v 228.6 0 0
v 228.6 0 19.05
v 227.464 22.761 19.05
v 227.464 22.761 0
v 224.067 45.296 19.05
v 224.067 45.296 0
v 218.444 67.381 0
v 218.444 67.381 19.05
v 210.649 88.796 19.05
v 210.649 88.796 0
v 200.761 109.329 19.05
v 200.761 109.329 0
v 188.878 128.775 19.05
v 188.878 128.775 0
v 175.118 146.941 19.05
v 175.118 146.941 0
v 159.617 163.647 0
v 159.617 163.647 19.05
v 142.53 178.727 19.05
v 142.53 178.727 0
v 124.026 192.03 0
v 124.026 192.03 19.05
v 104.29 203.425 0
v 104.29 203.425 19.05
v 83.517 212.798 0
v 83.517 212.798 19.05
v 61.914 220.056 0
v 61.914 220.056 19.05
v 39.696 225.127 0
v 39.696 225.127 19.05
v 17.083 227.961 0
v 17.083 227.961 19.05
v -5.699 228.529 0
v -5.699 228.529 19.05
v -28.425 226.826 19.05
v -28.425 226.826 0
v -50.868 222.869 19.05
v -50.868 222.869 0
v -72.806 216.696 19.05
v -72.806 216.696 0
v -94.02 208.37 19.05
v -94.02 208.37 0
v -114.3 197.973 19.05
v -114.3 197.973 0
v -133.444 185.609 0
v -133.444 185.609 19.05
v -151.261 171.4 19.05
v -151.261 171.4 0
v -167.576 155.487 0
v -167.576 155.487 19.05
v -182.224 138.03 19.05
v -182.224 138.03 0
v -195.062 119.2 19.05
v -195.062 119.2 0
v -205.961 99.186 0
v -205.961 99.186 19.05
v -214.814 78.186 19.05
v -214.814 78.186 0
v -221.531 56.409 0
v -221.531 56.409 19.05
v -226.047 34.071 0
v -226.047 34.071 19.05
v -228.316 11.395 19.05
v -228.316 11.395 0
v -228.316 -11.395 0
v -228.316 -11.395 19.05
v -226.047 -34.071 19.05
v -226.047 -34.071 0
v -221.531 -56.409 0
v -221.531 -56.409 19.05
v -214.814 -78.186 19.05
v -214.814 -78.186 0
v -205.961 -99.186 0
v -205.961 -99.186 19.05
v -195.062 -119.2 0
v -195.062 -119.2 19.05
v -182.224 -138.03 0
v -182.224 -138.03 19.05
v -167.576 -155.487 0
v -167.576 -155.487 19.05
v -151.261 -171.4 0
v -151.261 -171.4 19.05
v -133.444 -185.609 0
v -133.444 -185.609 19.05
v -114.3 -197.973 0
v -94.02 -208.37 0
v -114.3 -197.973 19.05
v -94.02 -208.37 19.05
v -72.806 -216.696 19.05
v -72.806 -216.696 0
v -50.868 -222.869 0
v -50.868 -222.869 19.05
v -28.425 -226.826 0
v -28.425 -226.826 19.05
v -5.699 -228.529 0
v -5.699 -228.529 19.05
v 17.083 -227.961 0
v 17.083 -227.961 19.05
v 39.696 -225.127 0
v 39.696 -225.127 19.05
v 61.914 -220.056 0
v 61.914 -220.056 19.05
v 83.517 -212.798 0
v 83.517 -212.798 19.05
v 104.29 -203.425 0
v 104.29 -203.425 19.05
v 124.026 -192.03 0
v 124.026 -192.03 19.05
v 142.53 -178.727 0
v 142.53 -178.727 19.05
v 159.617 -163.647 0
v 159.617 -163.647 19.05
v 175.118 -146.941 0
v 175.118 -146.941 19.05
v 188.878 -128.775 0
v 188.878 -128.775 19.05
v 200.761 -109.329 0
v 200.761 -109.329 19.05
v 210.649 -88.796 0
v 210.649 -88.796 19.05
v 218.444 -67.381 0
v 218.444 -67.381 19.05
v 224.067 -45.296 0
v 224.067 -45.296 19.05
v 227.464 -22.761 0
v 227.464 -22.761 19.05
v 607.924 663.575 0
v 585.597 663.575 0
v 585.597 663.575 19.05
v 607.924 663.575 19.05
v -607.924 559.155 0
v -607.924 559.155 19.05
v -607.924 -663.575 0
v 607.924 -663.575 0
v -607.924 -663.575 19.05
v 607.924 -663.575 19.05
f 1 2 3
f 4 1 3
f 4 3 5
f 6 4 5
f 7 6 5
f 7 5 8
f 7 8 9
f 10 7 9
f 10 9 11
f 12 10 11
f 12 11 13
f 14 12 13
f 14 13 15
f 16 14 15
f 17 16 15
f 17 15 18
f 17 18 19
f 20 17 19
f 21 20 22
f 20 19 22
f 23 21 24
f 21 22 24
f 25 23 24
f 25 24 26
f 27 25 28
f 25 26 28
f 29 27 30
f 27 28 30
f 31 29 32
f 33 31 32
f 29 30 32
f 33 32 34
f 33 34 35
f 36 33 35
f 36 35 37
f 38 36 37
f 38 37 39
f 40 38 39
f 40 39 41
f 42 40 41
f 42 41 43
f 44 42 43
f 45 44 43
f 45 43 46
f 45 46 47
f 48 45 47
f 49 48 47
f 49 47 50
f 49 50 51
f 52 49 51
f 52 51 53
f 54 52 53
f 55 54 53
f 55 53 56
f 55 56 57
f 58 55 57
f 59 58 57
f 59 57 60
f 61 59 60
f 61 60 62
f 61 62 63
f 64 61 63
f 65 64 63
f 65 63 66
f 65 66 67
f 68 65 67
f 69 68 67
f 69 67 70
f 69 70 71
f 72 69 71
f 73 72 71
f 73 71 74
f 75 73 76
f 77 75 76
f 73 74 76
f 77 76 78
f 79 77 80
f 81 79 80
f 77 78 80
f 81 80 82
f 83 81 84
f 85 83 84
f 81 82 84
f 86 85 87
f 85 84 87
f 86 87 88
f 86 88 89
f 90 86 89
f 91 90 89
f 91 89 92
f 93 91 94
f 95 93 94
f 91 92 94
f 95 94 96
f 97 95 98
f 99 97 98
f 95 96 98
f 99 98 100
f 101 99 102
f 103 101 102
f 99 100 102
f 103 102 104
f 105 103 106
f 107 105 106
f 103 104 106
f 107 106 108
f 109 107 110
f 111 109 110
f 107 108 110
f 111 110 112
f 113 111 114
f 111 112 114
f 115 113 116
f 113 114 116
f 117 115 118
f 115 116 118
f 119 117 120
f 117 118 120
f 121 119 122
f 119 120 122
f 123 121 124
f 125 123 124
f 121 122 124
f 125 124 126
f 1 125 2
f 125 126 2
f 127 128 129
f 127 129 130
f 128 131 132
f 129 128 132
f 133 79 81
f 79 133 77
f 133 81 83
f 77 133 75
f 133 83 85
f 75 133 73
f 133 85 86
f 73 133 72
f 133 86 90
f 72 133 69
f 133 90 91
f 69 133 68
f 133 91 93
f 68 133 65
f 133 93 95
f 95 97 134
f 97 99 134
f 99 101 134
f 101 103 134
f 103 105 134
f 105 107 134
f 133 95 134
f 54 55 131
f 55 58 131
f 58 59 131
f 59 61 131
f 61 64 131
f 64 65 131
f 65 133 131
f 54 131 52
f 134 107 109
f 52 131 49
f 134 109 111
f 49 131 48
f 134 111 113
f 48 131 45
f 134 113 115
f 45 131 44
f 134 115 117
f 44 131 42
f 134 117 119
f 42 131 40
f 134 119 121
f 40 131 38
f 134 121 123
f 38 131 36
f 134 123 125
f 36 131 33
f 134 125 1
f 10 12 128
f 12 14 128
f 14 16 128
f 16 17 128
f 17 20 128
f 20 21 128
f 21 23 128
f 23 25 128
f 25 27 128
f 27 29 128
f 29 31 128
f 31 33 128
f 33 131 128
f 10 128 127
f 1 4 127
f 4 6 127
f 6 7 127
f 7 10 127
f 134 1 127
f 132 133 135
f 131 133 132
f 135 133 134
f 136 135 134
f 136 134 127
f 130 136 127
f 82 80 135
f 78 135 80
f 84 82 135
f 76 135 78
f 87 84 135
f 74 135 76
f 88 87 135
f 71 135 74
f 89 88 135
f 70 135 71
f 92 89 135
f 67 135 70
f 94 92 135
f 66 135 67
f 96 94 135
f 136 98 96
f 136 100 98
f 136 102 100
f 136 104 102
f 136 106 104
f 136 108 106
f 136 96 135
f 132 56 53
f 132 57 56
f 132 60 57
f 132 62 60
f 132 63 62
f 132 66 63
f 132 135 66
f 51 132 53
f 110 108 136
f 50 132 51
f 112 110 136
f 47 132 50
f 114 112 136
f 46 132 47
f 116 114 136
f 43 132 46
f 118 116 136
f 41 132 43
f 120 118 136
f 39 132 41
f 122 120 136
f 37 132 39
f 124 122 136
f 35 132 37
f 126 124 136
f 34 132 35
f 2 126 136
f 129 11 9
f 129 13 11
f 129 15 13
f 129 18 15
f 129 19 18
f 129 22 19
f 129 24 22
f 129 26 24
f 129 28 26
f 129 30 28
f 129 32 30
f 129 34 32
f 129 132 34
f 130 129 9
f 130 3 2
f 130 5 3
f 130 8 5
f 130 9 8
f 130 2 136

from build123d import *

# Parameters (mm, degrees)
F0_W     = 1215.8472
F0_H     = 1327.15
F1_DEPTH = 19.05
F2_SIZE2 = 104.4195221847
F2_SIZE  = 1193.5206
F3_R     = 228.6
F4_DEPTH = 19.051


with BuildPart() as f1:
    # F0 (on Top) → F1 (new body)
    with BuildSketch(Plane.XY):
        Rectangle(F0_W, F0_H)
    extrude(amount=F1_DEPTH)

    # F2
    f2_edges = [f1.edges().sort_by_distance(p)[0] for p in [
        (-607.9236, 663.575, 9.525),
    ]]
    f2_side = f1.faces().sort_by_distance((0, 663.575, 9.525))[0]
    chamfer(f2_edges, length=F2_SIZE, length2=F2_SIZE2, reference=f2_side)

    # F3 (on face) → F4 (cut, through all)
    with BuildSketch(Plane.XY.offset(19.05)):
        Circle(F3_R)
    extrude(amount=-F4_DEPTH, mode=Mode.SUBTRACT)


solid = f1.part
